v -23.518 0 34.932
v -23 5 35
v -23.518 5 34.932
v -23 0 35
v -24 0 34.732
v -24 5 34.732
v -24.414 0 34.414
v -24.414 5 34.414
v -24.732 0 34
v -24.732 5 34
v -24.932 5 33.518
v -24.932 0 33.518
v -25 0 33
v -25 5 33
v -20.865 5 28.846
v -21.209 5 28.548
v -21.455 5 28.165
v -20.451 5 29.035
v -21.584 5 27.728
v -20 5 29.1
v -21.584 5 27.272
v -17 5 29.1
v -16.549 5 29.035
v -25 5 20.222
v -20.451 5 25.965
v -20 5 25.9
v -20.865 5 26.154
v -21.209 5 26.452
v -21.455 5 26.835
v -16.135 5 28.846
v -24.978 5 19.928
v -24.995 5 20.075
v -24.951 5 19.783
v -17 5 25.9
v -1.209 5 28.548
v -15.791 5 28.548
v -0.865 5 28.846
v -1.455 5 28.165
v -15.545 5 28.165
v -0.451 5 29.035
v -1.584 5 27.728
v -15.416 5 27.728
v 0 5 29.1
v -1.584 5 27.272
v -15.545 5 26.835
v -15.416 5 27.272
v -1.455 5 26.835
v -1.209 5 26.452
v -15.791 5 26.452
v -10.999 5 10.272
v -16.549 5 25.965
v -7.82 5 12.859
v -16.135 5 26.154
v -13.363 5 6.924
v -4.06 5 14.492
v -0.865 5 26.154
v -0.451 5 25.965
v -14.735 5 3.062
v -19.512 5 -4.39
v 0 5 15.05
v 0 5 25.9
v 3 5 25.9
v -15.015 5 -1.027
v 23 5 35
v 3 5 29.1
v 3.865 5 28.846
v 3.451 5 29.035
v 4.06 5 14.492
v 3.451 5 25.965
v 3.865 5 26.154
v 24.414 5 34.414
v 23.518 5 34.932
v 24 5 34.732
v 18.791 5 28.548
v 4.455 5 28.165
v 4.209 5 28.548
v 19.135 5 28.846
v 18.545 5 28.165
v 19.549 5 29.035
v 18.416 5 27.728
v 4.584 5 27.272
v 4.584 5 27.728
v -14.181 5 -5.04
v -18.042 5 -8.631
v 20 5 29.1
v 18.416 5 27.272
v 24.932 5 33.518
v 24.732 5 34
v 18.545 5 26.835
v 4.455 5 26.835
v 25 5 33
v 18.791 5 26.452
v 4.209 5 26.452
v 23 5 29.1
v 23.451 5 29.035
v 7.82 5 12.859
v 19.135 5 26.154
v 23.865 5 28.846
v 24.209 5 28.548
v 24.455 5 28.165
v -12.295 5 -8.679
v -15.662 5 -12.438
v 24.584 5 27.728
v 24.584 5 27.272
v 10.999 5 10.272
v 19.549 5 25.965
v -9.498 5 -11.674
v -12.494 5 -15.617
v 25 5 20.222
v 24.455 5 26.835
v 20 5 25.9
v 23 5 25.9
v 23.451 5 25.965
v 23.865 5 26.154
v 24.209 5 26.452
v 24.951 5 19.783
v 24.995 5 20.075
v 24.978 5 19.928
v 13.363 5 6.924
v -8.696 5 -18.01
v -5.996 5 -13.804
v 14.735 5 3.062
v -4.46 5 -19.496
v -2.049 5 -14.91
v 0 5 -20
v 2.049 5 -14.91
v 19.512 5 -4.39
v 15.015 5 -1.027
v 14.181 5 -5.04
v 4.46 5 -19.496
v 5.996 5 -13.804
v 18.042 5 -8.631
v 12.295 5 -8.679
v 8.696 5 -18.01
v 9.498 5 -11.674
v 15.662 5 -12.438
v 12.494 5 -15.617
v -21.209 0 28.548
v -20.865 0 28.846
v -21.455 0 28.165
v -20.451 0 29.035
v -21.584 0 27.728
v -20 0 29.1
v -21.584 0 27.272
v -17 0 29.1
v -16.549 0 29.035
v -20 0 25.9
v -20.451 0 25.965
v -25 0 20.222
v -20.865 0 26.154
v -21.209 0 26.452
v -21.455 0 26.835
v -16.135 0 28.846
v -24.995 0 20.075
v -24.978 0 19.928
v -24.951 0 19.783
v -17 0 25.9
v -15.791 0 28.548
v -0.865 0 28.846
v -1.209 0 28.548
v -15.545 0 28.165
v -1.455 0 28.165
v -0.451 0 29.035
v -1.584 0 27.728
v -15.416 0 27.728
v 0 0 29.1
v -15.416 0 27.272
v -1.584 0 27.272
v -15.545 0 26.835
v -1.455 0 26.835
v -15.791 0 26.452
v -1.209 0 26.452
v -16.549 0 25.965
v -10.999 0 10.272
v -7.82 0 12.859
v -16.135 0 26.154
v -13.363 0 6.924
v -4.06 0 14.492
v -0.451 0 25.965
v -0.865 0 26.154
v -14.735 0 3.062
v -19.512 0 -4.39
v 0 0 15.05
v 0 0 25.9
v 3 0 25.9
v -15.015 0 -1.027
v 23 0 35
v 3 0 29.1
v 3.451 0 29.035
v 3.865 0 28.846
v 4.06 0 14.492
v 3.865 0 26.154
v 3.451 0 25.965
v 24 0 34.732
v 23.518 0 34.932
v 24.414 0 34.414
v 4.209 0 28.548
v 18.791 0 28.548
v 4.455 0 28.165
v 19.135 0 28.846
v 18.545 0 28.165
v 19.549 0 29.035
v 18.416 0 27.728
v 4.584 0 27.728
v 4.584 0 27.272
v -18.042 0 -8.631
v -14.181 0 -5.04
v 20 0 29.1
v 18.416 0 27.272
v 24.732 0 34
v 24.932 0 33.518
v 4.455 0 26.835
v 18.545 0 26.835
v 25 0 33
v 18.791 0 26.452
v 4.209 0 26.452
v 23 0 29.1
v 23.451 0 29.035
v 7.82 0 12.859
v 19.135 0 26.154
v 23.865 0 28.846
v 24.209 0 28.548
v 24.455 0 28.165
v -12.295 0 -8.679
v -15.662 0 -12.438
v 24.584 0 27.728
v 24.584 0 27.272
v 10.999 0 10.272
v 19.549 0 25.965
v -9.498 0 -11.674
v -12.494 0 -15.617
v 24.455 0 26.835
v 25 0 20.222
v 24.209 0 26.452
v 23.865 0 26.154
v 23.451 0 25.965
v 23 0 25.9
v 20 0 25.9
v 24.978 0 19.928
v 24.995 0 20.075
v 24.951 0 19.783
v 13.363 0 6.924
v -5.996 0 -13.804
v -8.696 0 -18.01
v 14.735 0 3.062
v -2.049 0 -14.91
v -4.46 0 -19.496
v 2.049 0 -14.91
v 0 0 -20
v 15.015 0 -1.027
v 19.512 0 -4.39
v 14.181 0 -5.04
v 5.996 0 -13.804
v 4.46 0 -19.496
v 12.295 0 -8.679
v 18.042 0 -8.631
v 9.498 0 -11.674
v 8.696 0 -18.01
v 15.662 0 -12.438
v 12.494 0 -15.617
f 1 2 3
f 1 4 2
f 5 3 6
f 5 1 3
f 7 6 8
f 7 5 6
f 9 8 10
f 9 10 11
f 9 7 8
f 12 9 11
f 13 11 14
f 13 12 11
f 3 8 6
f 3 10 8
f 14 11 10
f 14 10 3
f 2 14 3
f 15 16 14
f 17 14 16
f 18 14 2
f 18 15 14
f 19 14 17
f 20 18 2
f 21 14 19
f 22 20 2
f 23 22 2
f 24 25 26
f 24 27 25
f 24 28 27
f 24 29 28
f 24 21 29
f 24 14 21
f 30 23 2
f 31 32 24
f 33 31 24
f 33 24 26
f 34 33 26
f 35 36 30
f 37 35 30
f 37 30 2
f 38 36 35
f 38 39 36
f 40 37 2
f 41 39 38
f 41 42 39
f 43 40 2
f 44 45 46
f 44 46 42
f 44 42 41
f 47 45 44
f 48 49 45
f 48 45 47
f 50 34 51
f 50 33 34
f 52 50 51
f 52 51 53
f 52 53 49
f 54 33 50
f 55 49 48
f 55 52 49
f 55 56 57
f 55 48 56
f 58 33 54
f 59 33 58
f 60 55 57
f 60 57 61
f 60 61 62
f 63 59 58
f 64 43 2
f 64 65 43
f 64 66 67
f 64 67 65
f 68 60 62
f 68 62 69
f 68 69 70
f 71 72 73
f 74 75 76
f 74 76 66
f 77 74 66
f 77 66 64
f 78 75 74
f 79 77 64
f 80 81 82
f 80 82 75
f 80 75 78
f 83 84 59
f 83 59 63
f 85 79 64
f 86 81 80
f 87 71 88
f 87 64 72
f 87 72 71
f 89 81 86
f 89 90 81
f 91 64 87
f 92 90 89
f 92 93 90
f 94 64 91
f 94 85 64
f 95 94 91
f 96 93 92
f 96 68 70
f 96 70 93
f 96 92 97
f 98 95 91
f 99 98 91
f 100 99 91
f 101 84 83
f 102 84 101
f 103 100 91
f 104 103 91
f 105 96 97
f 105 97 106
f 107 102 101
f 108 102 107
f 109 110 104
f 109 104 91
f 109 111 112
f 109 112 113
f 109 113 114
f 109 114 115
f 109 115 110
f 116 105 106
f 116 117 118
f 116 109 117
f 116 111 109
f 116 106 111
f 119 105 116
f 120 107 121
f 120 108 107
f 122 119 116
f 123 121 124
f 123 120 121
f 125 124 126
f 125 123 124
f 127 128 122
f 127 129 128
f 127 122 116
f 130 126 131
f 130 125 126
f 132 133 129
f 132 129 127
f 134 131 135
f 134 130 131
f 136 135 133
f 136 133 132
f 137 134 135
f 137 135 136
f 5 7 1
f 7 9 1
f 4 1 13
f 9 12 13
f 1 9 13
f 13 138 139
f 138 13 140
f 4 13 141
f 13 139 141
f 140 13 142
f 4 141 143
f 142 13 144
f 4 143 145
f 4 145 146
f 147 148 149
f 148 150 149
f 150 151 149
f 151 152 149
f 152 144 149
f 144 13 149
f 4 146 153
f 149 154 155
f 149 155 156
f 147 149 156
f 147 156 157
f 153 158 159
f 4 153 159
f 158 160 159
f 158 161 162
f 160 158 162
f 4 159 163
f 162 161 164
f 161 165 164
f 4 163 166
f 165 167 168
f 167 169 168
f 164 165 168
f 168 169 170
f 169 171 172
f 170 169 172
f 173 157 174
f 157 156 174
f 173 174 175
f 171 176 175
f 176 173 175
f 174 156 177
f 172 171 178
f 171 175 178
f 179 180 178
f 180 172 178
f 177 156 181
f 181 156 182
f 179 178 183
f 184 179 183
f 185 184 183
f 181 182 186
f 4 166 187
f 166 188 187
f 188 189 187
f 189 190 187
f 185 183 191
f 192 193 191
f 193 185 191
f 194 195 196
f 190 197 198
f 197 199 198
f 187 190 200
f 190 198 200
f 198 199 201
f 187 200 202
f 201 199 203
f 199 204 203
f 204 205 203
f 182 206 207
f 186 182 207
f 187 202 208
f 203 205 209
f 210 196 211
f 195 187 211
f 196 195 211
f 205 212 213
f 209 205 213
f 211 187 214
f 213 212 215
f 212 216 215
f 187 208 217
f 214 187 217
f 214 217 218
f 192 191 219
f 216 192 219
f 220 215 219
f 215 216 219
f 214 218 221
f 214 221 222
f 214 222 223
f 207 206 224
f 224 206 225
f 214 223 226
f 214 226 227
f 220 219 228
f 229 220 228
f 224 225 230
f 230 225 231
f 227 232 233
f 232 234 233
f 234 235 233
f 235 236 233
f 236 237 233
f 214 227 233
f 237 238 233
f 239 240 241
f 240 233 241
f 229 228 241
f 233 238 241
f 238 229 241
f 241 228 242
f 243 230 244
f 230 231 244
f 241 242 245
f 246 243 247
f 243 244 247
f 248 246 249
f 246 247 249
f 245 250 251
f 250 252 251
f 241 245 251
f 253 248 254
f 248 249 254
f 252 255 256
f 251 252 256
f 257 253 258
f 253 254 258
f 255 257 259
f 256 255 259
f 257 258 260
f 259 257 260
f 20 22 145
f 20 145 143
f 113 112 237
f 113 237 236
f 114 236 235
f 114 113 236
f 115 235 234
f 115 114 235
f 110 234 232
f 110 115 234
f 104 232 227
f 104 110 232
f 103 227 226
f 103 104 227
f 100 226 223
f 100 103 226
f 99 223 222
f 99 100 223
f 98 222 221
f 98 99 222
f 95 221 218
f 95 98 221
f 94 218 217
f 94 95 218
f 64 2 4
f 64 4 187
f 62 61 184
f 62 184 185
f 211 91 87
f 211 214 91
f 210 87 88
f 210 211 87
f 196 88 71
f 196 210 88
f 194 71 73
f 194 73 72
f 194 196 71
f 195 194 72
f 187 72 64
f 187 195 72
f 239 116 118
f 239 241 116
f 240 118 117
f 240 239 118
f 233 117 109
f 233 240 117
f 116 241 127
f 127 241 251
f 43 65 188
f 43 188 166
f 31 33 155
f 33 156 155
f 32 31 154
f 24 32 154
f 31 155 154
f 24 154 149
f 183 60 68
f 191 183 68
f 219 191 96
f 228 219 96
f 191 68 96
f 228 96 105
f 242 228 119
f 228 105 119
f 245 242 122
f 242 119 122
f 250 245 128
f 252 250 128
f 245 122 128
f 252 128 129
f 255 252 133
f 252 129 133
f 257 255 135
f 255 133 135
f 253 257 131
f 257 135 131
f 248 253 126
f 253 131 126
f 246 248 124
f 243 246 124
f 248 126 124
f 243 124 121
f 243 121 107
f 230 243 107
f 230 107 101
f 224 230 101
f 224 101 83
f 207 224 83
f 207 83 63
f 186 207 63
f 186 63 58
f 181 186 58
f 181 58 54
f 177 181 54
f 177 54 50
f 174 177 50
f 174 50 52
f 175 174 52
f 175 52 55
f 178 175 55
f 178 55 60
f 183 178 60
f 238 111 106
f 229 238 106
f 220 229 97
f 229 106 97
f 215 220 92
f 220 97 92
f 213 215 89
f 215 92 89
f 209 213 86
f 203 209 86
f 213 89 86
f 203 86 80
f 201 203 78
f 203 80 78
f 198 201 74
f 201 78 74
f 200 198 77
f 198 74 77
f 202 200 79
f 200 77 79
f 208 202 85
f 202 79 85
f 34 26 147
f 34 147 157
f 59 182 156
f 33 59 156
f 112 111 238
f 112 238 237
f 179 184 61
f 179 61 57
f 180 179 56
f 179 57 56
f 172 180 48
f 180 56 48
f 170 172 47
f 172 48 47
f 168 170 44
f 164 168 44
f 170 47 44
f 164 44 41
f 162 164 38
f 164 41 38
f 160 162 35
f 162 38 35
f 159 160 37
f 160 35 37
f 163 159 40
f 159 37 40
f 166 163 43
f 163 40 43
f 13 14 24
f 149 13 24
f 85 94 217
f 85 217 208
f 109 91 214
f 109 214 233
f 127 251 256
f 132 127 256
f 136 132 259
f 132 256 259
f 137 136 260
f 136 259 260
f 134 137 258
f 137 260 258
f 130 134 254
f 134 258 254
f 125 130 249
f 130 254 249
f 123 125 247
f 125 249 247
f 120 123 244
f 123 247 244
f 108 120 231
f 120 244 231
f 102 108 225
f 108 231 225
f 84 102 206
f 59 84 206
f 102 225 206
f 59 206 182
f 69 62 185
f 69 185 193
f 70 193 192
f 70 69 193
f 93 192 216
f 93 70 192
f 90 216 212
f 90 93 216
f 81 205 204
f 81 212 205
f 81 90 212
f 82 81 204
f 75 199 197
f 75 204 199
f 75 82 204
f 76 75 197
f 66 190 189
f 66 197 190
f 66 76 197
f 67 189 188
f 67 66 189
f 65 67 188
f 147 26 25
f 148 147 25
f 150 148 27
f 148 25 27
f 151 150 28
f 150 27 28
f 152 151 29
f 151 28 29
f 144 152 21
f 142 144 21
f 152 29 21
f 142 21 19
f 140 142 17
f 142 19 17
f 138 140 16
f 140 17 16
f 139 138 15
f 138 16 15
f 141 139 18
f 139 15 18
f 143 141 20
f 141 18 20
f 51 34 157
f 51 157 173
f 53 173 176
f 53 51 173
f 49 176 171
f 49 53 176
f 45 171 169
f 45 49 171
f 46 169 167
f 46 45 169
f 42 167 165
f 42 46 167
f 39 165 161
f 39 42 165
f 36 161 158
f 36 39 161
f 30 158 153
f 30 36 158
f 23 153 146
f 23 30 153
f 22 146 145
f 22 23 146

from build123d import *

# Parameters (mm, degrees)
SKETCH_1_R          = 20
SKETCH_1_R_2        = 6.5
SKETCH_1_R_3        = 1.6
EXTRUDE_1_DEPTH     = 5
SKETCH_2_W          = 50
SKETCH_2_H          = 15
SKETCH_2_R          = 1.6
EXTRUDE_2_DEPTH     = 5
EXTRUDE_START       = -5
EXTRUDE_4_DEPTH     = 5
SKETCH_5_R          = 3.5
CUT_EXTRUDE_1_DEPTH = 3
FILLET_1_R          = 2
SKETCH_6_R          = 15.05
CUT_EXTRUDE_2_DEPTH = 44.301270189
CUT_EXTRUDE_3_DEPTH = 44.301270189


with BuildPart() as part:
    # 草图1 → 凸台-拉伸1 (new body)
    with BuildSketch(Plane(origin=(0, 0, 0), x_dir=(1, 0, 0), z_dir=(0, 1, 0))):
        with Locations(Location((0, 0, 0), (0, 0, 270))):
            Circle(SKETCH_1_R)
        with Locations(Location((0, 0, 0), (0, 0, 270))):
            Circle(SKETCH_1_R_2, mode=Mode.SUBTRACT)
        with Locations(Location((0, 9.5, 0), (0, 0, 270))):
            Circle(SKETCH_1_R_3, mode=Mode.SUBTRACT)
        with Locations(Location((8.227241336, -4.75, 0), (0, 0, 270))):
            Circle(SKETCH_1_R_3, mode=Mode.SUBTRACT)
        with Locations(Location((-8.227241336, -4.75, 0), (0, 0, 270))):
            Circle(SKETCH_1_R_3, mode=Mode.SUBTRACT)
    extrude(amount=EXTRUDE_1_DEPTH)



with BuildPart() as body_2:
    # 草图2 → 凸台-拉伸2 (new body)
    with BuildSketch(Plane(origin=(0, 5, 0), x_dir=(1, 0, 0), z_dir=(0, 1, 0))):
        with Locations((0, -27.5)):
            Rectangle(SKETCH_2_W, SKETCH_2_H)
        with Locations(Location((-20, -27.5, 0), (0, 0, 270))):
            Circle(SKETCH_2_R, mode=Mode.SUBTRACT)
        with Locations(Location((20, -27.5, 0), (0, 0, 270))):
            Circle(SKETCH_2_R, mode=Mode.SUBTRACT)
        with Locations(Location((0, -27.5, 0), (0, 0, 270))):
            Circle(SKETCH_2_R, mode=Mode.SUBTRACT)
    extrude(amount=-EXTRUDE_2_DEPTH)


with BuildPart() as part_1:
    add(part.part)

    add(body_2.part)  # 凸台-拉伸4 merges body 2
    # 草图4 → 凸台-拉伸4 (add)
    with BuildSketch(Plane(origin=(0, 5, 0), x_dir=(1, 0, 0), z_dir=(0, 1, 0)).offset(EXTRUDE_START)):
        with BuildLine():
            Line((-19.512195122, 4.390243902), (-25, -20))
            Line((-25, -20), (0, -20))
            ThreePointArc((0, -20), (-15.617376189, -12.493900951), (-19.512195122, 4.390243902))
        make_face()
        with BuildLine():
            ThreePointArc((20, 0), (14.142135624, -14.142135624), (0, -20))
            Line((0, -20), (25, -20))
            Line((25, -20), (19.512195122, 4.390243902))
            ThreePointArc((19.512195122, 4.390243902), (19.877674693, 2.208630521), (20, 0))
        make_face()
    extrude(amount=EXTRUDE_4_DEPTH)

    # 草图5 → 切除-拉伸1 (cut)
    with BuildSketch(Plane(origin=(0, 5, 0), x_dir=(1, 0, 0), z_dir=(0, 1, 0))):
        with Locations((-8.227241336, -4.75)):
            Circle(SKETCH_5_R)
        with Locations((8.227241336, -4.75)):
            Circle(SKETCH_5_R)
        with Locations((0, 9.5)):
            Circle(SKETCH_5_R)
    extrude(amount=-CUT_EXTRUDE_1_DEPTH, mode=Mode.SUBTRACT)

    # 圆角1
    fillet_1_edges = [part_1.edges().sort_by_distance(p)[0] for p in [
        (-25, 2.5, 20),
        (25, 2.5, 20),
        (25, 2.5, 35),
        (-25, 2.5, 35),
    ]]
    fillet(fillet_1_edges, radius=FILLET_1_R)

    # 草图6 → 切除-拉伸2 (cut, through all)
    with BuildSketch(Plane(origin=(0, 5, 0), x_dir=(1, 0, 0), z_dir=(0, 1, 0))):
        with Locations(Location((0, 0, 0), (0, 0, 270))):
            Circle(SKETCH_6_R)
    extrude(amount=-CUT_EXTRUDE_2_DEPTH, mode=Mode.SUBTRACT)

    # 草图7 → 切除-拉伸3 (cut, through all)
    with BuildSketch(Plane(origin=(0, 5, 0), x_dir=(1, 0, 0), z_dir=(0, 1, 0))):
        with BuildLine():
            Line((-20, -25.9), (-17, -25.9))
            ThreePointArc((-17, -25.9), (-15.4, -27.5), (-17, -29.1))
            Line((-17, -29.1), (-20, -29.1))
            ThreePointArc((-20, -29.1), (-21.6, -27.5), (-20, -25.9))
        make_face()
        with BuildLine():
            Line((0, -25.9), (3, -25.9))
            ThreePointArc((3, -25.9), (4.6, -27.5), (3, -29.1))
            Line((3, -29.1), (0, -29.1))
            ThreePointArc((0, -29.1), (-1.6, -27.5), (0, -25.9))
        make_face()
        with BuildLine():
            Line((20, -25.9), (23, -25.9))
            ThreePointArc((23, -25.9), (24.6, -27.5), (23, -29.1))
            Line((23, -29.1), (20, -29.1))
            ThreePointArc((20, -29.1), (18.4, -27.5), (20, -25.9))
        make_face()
    extrude(amount=-CUT_EXTRUDE_3_DEPTH, mode=Mode.SUBTRACT)


solid = part_1.part
